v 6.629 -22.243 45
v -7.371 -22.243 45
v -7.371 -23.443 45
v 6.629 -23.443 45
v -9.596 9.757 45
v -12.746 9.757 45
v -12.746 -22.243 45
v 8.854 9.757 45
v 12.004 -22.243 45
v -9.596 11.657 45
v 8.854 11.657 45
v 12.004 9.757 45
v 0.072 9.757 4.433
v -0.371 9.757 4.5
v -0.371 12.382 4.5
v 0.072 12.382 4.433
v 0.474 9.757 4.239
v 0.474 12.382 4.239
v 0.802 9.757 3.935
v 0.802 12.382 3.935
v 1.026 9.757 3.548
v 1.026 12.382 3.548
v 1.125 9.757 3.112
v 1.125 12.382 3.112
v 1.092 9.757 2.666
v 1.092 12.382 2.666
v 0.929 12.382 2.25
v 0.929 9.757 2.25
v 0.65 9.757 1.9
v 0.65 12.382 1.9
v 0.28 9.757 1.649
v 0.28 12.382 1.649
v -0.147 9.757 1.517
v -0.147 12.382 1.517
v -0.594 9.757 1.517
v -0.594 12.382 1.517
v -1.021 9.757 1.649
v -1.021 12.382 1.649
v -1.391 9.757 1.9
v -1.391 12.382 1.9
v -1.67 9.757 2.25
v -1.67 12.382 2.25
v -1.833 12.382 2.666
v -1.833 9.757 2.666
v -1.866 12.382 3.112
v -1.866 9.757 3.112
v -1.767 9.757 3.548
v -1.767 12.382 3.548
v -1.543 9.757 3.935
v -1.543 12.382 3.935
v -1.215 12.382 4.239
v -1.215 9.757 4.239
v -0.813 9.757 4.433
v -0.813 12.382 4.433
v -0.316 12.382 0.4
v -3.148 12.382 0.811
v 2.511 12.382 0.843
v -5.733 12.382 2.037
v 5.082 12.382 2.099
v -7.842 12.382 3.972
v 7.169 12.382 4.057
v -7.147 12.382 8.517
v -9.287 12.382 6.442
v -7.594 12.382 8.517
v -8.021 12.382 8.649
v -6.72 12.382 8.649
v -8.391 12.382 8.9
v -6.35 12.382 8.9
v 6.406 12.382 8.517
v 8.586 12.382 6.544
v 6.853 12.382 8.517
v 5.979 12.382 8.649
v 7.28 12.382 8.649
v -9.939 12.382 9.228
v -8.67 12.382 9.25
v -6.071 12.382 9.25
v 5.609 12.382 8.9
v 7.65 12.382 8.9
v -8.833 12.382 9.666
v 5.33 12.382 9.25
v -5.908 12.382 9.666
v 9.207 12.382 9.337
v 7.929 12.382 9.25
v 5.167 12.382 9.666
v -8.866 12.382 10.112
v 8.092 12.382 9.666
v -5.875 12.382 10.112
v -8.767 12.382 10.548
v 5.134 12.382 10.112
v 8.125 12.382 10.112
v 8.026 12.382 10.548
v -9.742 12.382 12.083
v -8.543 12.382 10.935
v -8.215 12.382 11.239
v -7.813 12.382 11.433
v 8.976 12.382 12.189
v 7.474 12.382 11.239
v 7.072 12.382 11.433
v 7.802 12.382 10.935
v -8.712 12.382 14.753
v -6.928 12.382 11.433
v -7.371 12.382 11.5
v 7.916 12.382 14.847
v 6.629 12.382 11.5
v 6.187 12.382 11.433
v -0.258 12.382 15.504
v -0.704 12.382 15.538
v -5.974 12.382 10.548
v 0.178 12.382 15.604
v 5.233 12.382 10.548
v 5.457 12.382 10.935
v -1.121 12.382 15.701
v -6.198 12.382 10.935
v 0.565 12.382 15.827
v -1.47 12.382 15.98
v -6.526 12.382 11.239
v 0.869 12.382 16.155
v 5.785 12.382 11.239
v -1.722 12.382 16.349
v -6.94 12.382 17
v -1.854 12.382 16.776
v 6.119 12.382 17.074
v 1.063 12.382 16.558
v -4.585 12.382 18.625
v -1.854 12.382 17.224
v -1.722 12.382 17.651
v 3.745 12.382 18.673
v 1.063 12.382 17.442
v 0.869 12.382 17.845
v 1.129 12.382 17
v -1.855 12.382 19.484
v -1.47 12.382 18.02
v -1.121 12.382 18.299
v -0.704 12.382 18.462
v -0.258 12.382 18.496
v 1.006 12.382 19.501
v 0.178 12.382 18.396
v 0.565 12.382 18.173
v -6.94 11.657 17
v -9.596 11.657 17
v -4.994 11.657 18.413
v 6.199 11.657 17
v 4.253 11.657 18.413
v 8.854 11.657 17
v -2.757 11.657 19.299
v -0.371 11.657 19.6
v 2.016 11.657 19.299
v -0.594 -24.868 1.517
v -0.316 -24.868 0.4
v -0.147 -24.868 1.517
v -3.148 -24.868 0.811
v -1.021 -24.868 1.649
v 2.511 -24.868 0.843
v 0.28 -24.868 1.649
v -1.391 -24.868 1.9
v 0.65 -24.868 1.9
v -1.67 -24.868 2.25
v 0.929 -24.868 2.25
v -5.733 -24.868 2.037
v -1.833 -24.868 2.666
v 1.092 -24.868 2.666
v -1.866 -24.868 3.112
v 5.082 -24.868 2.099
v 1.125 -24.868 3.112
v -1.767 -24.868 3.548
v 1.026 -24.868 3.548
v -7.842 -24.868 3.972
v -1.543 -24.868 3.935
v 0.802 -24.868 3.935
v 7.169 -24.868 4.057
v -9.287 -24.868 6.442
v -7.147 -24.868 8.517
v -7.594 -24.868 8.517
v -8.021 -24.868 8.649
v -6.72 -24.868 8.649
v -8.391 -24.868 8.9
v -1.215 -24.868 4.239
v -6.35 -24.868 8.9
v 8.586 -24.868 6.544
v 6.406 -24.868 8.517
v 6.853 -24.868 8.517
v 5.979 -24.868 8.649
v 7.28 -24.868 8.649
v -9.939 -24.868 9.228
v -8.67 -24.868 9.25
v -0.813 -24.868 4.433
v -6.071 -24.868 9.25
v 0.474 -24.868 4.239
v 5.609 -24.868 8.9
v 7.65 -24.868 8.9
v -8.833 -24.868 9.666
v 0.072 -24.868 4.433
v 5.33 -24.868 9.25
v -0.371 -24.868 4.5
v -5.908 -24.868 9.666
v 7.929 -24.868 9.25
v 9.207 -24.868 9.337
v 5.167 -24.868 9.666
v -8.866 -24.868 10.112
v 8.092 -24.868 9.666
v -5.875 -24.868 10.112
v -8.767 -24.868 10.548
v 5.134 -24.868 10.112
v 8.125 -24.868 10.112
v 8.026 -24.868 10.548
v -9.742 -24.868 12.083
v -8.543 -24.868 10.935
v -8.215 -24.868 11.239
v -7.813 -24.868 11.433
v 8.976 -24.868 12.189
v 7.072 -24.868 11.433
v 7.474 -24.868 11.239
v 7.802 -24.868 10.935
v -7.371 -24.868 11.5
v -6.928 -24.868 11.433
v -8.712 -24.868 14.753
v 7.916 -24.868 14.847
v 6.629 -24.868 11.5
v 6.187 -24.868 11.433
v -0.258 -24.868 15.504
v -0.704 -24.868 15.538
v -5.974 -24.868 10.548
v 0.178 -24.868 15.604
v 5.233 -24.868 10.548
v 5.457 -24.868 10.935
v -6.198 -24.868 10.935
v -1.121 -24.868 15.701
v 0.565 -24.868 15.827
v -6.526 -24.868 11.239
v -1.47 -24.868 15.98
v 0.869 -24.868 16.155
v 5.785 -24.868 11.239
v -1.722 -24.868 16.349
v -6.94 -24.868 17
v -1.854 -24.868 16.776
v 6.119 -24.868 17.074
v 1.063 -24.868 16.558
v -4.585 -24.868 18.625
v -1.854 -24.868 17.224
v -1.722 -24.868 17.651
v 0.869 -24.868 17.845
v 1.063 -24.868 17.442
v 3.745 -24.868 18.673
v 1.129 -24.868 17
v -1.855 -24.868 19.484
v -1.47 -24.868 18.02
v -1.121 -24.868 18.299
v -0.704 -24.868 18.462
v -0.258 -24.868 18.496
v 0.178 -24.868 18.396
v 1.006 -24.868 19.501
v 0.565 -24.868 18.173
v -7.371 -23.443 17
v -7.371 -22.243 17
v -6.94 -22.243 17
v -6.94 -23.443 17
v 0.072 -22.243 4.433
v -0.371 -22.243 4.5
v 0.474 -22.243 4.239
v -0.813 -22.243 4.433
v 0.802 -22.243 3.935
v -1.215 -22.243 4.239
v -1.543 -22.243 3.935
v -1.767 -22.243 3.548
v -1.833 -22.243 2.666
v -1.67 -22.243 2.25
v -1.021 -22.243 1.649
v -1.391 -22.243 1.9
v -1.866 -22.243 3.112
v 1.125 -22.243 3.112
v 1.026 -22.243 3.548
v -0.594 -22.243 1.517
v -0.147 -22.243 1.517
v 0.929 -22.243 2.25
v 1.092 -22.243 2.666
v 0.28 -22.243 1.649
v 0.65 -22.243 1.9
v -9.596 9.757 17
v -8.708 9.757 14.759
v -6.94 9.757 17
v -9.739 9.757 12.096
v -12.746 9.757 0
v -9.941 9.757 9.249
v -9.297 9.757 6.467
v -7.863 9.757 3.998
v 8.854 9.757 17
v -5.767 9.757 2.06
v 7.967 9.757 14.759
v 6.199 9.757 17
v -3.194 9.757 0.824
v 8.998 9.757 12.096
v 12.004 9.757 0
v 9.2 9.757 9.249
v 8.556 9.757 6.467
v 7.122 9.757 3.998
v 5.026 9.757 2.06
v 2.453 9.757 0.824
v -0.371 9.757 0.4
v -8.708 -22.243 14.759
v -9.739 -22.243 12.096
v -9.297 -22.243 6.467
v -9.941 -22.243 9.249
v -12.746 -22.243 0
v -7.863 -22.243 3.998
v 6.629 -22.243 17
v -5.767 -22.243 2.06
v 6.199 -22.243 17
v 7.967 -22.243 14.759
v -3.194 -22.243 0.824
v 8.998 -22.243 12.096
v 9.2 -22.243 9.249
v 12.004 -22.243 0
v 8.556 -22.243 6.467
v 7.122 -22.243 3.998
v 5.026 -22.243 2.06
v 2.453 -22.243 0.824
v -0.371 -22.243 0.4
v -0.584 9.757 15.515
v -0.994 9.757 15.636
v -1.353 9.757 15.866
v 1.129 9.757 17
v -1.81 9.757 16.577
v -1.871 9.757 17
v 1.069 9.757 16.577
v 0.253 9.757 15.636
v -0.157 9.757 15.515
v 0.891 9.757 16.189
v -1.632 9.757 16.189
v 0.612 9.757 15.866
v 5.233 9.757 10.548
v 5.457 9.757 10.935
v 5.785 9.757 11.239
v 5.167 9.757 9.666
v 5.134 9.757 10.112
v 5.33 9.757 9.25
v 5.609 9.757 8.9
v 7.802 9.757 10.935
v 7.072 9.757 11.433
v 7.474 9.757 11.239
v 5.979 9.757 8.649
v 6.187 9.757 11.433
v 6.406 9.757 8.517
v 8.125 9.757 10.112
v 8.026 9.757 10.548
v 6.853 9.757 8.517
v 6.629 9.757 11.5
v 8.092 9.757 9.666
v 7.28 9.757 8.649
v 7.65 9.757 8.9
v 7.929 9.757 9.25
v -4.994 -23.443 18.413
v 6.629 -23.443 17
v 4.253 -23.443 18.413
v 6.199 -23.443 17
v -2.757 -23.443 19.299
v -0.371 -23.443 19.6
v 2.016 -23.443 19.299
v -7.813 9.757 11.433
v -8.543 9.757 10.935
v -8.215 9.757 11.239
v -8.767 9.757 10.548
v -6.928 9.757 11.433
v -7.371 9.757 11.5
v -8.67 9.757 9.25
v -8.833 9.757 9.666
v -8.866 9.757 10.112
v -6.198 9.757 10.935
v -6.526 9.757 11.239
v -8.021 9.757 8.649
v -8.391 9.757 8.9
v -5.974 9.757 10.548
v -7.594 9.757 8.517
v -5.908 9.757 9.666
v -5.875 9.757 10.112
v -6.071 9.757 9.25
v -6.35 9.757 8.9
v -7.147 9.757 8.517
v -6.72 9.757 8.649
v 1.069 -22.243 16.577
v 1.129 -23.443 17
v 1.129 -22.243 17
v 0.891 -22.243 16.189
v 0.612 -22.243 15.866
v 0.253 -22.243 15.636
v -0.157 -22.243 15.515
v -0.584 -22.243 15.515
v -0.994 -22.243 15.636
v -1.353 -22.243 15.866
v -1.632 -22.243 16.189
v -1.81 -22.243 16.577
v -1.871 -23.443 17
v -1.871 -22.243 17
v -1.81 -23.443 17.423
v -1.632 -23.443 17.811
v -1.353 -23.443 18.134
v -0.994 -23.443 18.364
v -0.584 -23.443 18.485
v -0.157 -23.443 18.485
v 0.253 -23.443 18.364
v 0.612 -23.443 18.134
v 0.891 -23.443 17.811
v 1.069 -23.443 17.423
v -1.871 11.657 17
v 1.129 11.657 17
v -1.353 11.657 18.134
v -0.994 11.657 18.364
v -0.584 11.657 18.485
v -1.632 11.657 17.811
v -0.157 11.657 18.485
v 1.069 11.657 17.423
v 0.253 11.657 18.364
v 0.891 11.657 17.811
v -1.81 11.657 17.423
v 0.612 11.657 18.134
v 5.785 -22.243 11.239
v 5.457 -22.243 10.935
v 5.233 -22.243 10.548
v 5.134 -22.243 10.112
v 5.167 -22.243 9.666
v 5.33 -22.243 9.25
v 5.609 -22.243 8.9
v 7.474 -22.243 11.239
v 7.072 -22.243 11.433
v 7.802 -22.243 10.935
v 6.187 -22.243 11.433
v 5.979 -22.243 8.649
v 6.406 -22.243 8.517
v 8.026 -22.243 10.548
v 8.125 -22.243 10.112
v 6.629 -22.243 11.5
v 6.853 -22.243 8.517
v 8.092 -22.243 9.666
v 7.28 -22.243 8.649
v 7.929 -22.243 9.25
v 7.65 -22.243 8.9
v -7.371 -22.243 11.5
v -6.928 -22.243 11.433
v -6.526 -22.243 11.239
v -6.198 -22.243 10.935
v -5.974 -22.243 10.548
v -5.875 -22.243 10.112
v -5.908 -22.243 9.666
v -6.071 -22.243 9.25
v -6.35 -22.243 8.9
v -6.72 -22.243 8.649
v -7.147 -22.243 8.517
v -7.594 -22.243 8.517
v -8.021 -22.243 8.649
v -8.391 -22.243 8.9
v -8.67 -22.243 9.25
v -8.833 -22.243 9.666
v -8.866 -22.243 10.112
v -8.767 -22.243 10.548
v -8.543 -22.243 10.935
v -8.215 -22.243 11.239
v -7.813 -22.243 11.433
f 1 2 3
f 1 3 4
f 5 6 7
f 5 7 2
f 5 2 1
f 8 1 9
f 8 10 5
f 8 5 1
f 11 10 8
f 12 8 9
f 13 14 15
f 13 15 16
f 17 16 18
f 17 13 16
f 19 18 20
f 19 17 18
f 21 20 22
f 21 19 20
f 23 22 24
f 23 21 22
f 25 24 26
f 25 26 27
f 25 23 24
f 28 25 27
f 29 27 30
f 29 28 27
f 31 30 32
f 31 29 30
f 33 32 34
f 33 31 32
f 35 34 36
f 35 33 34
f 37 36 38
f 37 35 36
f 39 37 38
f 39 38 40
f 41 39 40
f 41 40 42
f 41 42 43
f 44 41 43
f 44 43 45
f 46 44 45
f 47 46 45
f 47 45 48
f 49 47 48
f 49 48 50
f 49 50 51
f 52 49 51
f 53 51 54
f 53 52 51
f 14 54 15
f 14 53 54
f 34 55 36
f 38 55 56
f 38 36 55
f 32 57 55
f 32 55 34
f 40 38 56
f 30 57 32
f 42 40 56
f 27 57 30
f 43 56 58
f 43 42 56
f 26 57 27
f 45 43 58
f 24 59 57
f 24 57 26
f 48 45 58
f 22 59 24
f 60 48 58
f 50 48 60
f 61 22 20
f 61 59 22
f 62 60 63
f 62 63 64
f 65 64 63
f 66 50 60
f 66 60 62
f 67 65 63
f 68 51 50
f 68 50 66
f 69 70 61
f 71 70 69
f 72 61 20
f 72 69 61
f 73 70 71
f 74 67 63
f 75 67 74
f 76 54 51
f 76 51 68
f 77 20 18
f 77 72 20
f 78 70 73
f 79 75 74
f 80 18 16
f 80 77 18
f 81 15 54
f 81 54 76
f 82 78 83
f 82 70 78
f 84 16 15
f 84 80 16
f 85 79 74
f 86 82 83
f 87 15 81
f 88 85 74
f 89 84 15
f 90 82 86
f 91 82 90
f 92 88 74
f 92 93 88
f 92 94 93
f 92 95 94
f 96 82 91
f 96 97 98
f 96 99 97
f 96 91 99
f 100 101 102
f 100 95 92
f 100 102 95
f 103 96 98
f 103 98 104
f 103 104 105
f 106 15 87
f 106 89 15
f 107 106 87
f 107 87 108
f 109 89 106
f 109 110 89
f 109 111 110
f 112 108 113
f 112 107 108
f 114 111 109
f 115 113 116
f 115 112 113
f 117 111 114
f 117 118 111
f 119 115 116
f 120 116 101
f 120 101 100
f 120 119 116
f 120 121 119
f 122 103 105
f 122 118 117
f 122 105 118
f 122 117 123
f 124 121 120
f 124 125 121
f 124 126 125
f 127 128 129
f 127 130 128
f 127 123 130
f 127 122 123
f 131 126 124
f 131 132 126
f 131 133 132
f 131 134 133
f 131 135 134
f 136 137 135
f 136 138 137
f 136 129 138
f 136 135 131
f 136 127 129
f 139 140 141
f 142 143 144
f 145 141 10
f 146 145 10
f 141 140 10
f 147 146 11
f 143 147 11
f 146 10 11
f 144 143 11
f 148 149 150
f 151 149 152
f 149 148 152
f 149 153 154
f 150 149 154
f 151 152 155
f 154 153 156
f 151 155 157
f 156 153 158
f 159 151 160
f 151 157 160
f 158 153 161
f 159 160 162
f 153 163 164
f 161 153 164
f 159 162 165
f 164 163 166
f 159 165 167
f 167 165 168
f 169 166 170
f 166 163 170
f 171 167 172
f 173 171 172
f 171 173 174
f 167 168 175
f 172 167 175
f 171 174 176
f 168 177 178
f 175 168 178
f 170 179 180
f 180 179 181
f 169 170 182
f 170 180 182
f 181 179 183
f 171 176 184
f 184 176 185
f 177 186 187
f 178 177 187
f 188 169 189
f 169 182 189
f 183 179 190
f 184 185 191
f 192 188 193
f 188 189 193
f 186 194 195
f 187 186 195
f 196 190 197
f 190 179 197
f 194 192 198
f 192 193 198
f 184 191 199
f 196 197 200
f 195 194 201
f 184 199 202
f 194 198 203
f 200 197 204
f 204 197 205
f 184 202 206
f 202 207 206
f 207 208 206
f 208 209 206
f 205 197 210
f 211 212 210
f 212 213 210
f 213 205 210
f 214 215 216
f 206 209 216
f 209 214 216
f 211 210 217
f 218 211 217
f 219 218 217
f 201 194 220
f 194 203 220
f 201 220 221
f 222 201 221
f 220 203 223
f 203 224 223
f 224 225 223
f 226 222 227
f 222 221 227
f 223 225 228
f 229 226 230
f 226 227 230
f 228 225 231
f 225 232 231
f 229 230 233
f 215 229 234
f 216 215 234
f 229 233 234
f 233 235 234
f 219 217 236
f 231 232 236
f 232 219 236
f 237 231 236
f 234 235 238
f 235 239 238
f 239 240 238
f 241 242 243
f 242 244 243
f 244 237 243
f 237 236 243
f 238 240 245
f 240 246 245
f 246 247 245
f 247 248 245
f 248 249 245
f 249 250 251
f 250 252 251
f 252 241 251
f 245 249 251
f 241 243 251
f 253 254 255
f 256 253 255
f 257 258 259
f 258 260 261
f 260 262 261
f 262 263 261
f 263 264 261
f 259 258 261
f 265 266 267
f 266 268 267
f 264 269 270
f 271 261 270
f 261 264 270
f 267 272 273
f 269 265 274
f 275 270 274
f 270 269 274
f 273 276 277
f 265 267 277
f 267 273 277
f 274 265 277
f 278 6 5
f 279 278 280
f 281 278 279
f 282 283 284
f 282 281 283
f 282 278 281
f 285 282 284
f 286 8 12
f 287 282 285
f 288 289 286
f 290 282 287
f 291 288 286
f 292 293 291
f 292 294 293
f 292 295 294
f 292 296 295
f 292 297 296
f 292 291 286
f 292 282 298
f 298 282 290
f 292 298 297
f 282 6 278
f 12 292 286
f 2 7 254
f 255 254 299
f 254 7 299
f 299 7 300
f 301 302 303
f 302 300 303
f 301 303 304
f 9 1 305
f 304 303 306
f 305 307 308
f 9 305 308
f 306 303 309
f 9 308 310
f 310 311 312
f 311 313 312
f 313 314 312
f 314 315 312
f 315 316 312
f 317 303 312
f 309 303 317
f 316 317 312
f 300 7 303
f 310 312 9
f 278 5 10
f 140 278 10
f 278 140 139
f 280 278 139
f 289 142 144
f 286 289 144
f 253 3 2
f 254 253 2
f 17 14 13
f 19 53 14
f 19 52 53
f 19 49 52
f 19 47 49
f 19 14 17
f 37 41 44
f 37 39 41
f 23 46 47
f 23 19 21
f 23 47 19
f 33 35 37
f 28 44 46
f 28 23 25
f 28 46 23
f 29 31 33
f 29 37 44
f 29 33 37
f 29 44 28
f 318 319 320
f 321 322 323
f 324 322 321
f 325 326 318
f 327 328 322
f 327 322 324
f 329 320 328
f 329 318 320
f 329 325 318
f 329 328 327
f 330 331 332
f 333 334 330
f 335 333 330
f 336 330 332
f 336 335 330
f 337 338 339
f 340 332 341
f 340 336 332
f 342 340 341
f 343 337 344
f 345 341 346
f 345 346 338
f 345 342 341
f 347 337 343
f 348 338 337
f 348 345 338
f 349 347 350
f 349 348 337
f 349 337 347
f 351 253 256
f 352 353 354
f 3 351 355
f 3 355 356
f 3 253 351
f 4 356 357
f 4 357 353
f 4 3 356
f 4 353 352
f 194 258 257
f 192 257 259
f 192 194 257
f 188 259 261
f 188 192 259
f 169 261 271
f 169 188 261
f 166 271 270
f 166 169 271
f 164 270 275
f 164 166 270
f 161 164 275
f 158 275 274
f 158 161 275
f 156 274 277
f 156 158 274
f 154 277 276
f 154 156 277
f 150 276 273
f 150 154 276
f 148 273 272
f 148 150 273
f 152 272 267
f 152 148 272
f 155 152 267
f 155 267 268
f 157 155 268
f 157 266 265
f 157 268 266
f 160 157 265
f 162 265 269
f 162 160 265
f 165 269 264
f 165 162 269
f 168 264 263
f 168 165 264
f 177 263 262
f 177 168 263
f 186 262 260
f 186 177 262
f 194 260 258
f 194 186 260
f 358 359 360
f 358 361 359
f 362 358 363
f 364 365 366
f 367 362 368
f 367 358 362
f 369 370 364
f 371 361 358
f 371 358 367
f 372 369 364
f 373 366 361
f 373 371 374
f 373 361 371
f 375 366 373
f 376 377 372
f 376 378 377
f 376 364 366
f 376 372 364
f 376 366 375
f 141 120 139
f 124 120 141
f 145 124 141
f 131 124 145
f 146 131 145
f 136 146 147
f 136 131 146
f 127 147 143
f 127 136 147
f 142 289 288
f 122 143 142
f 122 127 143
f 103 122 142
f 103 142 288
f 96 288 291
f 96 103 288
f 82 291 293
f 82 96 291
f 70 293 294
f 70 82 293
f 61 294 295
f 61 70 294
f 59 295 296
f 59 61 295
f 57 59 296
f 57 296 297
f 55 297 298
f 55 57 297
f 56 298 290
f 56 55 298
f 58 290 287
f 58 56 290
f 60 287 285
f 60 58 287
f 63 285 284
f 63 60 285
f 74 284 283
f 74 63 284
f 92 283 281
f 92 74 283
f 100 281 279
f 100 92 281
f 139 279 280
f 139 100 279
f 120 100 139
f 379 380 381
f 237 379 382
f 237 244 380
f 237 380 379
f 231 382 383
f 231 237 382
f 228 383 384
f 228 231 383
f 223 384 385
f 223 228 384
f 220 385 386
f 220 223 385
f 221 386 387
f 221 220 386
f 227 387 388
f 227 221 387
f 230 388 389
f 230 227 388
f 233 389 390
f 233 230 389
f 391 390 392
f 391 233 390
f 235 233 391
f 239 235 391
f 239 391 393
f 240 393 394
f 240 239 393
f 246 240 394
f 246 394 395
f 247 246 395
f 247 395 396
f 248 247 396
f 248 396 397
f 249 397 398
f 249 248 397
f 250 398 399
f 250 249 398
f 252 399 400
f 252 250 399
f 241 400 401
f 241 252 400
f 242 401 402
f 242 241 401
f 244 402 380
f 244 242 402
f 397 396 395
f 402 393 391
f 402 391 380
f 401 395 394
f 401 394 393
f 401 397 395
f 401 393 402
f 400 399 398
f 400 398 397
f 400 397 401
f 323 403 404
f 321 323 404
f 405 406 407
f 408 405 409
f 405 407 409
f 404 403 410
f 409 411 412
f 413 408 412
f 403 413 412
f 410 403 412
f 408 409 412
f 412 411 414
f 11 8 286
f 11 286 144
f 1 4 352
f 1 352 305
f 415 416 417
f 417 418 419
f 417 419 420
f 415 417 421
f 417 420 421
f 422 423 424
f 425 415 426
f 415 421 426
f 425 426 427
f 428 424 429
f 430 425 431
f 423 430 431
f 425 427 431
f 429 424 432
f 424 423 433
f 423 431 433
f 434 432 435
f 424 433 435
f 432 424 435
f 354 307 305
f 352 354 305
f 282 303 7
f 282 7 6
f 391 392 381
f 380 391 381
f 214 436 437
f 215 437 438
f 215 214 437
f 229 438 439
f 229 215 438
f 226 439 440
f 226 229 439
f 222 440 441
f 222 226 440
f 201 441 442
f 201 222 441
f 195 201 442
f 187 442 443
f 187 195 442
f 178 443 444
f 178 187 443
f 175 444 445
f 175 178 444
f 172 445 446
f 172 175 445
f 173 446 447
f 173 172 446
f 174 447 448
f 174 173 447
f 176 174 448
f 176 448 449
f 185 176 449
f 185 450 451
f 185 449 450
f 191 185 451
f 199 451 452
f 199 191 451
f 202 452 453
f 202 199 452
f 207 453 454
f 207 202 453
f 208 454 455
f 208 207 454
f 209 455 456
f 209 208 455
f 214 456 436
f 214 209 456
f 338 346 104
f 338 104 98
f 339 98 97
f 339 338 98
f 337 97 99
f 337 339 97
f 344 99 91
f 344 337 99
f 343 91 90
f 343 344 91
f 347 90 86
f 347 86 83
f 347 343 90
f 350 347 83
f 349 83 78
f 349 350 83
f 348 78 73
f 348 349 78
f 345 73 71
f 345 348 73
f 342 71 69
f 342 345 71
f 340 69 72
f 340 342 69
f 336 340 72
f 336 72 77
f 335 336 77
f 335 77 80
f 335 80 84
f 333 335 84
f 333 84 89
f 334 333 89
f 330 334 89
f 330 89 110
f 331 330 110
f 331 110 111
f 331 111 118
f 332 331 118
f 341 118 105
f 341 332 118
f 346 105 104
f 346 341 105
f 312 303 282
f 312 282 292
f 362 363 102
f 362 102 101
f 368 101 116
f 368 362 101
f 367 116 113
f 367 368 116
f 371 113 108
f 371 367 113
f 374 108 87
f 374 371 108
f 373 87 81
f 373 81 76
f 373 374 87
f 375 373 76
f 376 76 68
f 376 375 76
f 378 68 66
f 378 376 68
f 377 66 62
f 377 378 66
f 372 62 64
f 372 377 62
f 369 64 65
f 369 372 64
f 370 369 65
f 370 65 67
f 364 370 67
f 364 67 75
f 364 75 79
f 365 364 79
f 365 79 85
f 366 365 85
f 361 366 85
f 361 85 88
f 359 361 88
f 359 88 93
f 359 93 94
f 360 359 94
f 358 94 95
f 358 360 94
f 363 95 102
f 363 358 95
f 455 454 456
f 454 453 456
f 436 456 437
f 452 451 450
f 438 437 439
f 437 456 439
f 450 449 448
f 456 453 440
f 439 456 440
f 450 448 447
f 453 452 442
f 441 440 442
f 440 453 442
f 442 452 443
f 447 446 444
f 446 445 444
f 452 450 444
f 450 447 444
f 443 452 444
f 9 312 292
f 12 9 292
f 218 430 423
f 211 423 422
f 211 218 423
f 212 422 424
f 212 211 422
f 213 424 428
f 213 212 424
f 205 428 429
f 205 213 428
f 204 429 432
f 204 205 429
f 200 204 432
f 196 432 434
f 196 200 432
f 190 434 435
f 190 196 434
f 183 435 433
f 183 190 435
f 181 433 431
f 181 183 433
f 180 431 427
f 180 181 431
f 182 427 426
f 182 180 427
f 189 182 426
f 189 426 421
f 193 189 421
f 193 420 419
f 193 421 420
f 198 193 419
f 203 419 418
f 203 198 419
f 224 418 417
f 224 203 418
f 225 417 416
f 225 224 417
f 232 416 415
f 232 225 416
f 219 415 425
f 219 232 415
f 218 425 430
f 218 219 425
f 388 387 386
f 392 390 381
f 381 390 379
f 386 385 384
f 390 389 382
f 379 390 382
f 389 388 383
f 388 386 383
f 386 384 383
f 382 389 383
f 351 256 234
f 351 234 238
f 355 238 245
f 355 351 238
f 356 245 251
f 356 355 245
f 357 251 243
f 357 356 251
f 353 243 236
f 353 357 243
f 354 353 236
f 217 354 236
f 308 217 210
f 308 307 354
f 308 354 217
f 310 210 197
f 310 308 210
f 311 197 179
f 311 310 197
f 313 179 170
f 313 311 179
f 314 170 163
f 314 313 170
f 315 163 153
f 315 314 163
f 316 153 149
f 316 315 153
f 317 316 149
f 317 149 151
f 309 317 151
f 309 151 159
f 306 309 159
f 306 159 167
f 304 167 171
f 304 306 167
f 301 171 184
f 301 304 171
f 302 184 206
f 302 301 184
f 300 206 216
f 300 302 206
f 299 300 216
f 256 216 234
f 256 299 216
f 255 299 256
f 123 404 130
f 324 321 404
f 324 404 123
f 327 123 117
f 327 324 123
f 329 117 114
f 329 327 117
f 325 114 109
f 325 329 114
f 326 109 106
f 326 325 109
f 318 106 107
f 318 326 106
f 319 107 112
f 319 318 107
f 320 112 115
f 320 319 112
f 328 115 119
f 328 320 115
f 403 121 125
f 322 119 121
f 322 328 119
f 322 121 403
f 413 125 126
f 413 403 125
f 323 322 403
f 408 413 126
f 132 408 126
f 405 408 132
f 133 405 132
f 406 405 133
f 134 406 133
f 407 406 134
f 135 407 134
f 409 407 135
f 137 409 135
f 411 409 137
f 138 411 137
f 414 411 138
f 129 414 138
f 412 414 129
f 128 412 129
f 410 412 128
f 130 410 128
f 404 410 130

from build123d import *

# Parameters (mm, degrees)
SKETCH_1_W      = 24.75
SKETCH_1_H      = 32
EXTRUDE_1_DEPTH = 45
SKETCH_2_W      = 18.45
SKETCH_2_H      = 1.9
SKETCH_2_W_2    = 14
SKETCH_2_H_2    = 1.2
EXTRUDE_2_DEPTH = 28
SKETCH_4_R      = 9.6
SKETCH_4_R_2    = 1.5
EXTRUDE_3_DEPTH = 18.625


with BuildPart() as part:
    # 草图1 → 凸台-拉伸1 (new body)
    with BuildSketch(Plane.XY):
        with Locations((-0.370508982, -6.243263473)):
            Rectangle(SKETCH_1_W, SKETCH_1_H)
    extrude(amount=EXTRUDE_1_DEPTH)

    # 草图2 → 凸台-拉伸2 (add)
    with BuildSketch(Plane.XY.offset(45)):
        with Locations((-0.370508982, 10.706736527)):
            Rectangle(SKETCH_2_W, SKETCH_2_H)
        with Locations((-0.370508982, -22.843263473)):
            Rectangle(SKETCH_2_W_2, SKETCH_2_H_2)
    extrude(amount=-EXTRUDE_2_DEPTH)

    # 草图4 → 凸台-拉伸3 (add, symmetric)
    with BuildSketch(Plane(origin=(0, -6.243263473, 0), x_dir=(1, 0, 0), z_dir=(0, 1, 0))):
        with Locations(Location((-0.370508982, -10, 0), (0, 0, 226.816578204))):
            Circle(SKETCH_4_R)
        with Locations(Location((-0.370508982, -3, 0), (0, 0, 270))):
            Circle(SKETCH_4_R_2, mode=Mode.SUBTRACT)
        with Locations(Location((6.629491018, -10, 0), (0, 0, 270))):
            Circle(SKETCH_4_R_2, mode=Mode.SUBTRACT)
        with Locations((-0.370508982, -17)):
            Circle(SKETCH_4_R_2, mode=Mode.SUBTRACT)
        with Locations(Location((-7.370508982, -10, 0), (0, 0, 270))):
            Circle(SKETCH_4_R_2, mode=Mode.SUBTRACT)
    extrude(amount=EXTRUDE_3_DEPTH, both=True)


solid = part.part
